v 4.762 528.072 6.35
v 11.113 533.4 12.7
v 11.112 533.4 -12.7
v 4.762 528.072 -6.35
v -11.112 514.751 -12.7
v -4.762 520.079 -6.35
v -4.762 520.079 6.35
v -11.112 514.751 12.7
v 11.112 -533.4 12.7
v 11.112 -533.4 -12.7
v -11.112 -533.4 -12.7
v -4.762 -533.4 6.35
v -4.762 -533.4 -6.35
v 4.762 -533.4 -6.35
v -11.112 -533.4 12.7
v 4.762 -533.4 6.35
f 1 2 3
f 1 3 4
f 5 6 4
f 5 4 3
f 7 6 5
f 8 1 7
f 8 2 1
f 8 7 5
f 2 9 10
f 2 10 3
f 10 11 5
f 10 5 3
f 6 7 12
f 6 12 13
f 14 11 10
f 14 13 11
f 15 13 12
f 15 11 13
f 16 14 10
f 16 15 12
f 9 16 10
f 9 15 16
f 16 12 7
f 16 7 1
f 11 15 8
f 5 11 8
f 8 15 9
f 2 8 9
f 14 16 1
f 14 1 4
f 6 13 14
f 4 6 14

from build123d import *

# Parameters (mm, degrees)
SKETCH2_W           = 22.225
SKETCH2_H           = 1066.8
BOSS_EXTRUDE1_DEPTH = 12.7
SKETCH3_W           = 9.525
SKETCH3_H           = 12.7
CUT_EXTRUDE1_DEPTH  = 1067.933464494
CUT_EXTRUDE2_DEPTH  = 535.120031132


with BuildPart() as part:
    # Sketch2 → Boss-Extrude1 (new, symmetric)
    with BuildSketch(Plane.XY):
        Rectangle(SKETCH2_W, SKETCH2_H)
    extrude(amount=BOSS_EXTRUDE1_DEPTH, both=True)

    # Sketch3 → Cut-Extrude1 (cut, through all)
    with BuildSketch(Plane(origin=(0, 533.4, 0), x_dir=(1, 0, 0), z_dir=(0, 1, 0))):
        Rectangle(SKETCH3_W, SKETCH3_H)
    extrude(amount=-CUT_EXTRUDE1_DEPTH, mode=Mode.SUBTRACT)

    # Sketch4 → Cut-Extrude2 (cut, through all)
    with BuildSketch(Plane.XY.offset(12.7)):
        Polygon((11.1125, 533.4), (-11.1125, 514.751010697), (-11.1125, 533.4), align=None)
    extrude(amount=-CUT_EXTRUDE2_DEPTH, mode=Mode.SUBTRACT)


solid = part.part
